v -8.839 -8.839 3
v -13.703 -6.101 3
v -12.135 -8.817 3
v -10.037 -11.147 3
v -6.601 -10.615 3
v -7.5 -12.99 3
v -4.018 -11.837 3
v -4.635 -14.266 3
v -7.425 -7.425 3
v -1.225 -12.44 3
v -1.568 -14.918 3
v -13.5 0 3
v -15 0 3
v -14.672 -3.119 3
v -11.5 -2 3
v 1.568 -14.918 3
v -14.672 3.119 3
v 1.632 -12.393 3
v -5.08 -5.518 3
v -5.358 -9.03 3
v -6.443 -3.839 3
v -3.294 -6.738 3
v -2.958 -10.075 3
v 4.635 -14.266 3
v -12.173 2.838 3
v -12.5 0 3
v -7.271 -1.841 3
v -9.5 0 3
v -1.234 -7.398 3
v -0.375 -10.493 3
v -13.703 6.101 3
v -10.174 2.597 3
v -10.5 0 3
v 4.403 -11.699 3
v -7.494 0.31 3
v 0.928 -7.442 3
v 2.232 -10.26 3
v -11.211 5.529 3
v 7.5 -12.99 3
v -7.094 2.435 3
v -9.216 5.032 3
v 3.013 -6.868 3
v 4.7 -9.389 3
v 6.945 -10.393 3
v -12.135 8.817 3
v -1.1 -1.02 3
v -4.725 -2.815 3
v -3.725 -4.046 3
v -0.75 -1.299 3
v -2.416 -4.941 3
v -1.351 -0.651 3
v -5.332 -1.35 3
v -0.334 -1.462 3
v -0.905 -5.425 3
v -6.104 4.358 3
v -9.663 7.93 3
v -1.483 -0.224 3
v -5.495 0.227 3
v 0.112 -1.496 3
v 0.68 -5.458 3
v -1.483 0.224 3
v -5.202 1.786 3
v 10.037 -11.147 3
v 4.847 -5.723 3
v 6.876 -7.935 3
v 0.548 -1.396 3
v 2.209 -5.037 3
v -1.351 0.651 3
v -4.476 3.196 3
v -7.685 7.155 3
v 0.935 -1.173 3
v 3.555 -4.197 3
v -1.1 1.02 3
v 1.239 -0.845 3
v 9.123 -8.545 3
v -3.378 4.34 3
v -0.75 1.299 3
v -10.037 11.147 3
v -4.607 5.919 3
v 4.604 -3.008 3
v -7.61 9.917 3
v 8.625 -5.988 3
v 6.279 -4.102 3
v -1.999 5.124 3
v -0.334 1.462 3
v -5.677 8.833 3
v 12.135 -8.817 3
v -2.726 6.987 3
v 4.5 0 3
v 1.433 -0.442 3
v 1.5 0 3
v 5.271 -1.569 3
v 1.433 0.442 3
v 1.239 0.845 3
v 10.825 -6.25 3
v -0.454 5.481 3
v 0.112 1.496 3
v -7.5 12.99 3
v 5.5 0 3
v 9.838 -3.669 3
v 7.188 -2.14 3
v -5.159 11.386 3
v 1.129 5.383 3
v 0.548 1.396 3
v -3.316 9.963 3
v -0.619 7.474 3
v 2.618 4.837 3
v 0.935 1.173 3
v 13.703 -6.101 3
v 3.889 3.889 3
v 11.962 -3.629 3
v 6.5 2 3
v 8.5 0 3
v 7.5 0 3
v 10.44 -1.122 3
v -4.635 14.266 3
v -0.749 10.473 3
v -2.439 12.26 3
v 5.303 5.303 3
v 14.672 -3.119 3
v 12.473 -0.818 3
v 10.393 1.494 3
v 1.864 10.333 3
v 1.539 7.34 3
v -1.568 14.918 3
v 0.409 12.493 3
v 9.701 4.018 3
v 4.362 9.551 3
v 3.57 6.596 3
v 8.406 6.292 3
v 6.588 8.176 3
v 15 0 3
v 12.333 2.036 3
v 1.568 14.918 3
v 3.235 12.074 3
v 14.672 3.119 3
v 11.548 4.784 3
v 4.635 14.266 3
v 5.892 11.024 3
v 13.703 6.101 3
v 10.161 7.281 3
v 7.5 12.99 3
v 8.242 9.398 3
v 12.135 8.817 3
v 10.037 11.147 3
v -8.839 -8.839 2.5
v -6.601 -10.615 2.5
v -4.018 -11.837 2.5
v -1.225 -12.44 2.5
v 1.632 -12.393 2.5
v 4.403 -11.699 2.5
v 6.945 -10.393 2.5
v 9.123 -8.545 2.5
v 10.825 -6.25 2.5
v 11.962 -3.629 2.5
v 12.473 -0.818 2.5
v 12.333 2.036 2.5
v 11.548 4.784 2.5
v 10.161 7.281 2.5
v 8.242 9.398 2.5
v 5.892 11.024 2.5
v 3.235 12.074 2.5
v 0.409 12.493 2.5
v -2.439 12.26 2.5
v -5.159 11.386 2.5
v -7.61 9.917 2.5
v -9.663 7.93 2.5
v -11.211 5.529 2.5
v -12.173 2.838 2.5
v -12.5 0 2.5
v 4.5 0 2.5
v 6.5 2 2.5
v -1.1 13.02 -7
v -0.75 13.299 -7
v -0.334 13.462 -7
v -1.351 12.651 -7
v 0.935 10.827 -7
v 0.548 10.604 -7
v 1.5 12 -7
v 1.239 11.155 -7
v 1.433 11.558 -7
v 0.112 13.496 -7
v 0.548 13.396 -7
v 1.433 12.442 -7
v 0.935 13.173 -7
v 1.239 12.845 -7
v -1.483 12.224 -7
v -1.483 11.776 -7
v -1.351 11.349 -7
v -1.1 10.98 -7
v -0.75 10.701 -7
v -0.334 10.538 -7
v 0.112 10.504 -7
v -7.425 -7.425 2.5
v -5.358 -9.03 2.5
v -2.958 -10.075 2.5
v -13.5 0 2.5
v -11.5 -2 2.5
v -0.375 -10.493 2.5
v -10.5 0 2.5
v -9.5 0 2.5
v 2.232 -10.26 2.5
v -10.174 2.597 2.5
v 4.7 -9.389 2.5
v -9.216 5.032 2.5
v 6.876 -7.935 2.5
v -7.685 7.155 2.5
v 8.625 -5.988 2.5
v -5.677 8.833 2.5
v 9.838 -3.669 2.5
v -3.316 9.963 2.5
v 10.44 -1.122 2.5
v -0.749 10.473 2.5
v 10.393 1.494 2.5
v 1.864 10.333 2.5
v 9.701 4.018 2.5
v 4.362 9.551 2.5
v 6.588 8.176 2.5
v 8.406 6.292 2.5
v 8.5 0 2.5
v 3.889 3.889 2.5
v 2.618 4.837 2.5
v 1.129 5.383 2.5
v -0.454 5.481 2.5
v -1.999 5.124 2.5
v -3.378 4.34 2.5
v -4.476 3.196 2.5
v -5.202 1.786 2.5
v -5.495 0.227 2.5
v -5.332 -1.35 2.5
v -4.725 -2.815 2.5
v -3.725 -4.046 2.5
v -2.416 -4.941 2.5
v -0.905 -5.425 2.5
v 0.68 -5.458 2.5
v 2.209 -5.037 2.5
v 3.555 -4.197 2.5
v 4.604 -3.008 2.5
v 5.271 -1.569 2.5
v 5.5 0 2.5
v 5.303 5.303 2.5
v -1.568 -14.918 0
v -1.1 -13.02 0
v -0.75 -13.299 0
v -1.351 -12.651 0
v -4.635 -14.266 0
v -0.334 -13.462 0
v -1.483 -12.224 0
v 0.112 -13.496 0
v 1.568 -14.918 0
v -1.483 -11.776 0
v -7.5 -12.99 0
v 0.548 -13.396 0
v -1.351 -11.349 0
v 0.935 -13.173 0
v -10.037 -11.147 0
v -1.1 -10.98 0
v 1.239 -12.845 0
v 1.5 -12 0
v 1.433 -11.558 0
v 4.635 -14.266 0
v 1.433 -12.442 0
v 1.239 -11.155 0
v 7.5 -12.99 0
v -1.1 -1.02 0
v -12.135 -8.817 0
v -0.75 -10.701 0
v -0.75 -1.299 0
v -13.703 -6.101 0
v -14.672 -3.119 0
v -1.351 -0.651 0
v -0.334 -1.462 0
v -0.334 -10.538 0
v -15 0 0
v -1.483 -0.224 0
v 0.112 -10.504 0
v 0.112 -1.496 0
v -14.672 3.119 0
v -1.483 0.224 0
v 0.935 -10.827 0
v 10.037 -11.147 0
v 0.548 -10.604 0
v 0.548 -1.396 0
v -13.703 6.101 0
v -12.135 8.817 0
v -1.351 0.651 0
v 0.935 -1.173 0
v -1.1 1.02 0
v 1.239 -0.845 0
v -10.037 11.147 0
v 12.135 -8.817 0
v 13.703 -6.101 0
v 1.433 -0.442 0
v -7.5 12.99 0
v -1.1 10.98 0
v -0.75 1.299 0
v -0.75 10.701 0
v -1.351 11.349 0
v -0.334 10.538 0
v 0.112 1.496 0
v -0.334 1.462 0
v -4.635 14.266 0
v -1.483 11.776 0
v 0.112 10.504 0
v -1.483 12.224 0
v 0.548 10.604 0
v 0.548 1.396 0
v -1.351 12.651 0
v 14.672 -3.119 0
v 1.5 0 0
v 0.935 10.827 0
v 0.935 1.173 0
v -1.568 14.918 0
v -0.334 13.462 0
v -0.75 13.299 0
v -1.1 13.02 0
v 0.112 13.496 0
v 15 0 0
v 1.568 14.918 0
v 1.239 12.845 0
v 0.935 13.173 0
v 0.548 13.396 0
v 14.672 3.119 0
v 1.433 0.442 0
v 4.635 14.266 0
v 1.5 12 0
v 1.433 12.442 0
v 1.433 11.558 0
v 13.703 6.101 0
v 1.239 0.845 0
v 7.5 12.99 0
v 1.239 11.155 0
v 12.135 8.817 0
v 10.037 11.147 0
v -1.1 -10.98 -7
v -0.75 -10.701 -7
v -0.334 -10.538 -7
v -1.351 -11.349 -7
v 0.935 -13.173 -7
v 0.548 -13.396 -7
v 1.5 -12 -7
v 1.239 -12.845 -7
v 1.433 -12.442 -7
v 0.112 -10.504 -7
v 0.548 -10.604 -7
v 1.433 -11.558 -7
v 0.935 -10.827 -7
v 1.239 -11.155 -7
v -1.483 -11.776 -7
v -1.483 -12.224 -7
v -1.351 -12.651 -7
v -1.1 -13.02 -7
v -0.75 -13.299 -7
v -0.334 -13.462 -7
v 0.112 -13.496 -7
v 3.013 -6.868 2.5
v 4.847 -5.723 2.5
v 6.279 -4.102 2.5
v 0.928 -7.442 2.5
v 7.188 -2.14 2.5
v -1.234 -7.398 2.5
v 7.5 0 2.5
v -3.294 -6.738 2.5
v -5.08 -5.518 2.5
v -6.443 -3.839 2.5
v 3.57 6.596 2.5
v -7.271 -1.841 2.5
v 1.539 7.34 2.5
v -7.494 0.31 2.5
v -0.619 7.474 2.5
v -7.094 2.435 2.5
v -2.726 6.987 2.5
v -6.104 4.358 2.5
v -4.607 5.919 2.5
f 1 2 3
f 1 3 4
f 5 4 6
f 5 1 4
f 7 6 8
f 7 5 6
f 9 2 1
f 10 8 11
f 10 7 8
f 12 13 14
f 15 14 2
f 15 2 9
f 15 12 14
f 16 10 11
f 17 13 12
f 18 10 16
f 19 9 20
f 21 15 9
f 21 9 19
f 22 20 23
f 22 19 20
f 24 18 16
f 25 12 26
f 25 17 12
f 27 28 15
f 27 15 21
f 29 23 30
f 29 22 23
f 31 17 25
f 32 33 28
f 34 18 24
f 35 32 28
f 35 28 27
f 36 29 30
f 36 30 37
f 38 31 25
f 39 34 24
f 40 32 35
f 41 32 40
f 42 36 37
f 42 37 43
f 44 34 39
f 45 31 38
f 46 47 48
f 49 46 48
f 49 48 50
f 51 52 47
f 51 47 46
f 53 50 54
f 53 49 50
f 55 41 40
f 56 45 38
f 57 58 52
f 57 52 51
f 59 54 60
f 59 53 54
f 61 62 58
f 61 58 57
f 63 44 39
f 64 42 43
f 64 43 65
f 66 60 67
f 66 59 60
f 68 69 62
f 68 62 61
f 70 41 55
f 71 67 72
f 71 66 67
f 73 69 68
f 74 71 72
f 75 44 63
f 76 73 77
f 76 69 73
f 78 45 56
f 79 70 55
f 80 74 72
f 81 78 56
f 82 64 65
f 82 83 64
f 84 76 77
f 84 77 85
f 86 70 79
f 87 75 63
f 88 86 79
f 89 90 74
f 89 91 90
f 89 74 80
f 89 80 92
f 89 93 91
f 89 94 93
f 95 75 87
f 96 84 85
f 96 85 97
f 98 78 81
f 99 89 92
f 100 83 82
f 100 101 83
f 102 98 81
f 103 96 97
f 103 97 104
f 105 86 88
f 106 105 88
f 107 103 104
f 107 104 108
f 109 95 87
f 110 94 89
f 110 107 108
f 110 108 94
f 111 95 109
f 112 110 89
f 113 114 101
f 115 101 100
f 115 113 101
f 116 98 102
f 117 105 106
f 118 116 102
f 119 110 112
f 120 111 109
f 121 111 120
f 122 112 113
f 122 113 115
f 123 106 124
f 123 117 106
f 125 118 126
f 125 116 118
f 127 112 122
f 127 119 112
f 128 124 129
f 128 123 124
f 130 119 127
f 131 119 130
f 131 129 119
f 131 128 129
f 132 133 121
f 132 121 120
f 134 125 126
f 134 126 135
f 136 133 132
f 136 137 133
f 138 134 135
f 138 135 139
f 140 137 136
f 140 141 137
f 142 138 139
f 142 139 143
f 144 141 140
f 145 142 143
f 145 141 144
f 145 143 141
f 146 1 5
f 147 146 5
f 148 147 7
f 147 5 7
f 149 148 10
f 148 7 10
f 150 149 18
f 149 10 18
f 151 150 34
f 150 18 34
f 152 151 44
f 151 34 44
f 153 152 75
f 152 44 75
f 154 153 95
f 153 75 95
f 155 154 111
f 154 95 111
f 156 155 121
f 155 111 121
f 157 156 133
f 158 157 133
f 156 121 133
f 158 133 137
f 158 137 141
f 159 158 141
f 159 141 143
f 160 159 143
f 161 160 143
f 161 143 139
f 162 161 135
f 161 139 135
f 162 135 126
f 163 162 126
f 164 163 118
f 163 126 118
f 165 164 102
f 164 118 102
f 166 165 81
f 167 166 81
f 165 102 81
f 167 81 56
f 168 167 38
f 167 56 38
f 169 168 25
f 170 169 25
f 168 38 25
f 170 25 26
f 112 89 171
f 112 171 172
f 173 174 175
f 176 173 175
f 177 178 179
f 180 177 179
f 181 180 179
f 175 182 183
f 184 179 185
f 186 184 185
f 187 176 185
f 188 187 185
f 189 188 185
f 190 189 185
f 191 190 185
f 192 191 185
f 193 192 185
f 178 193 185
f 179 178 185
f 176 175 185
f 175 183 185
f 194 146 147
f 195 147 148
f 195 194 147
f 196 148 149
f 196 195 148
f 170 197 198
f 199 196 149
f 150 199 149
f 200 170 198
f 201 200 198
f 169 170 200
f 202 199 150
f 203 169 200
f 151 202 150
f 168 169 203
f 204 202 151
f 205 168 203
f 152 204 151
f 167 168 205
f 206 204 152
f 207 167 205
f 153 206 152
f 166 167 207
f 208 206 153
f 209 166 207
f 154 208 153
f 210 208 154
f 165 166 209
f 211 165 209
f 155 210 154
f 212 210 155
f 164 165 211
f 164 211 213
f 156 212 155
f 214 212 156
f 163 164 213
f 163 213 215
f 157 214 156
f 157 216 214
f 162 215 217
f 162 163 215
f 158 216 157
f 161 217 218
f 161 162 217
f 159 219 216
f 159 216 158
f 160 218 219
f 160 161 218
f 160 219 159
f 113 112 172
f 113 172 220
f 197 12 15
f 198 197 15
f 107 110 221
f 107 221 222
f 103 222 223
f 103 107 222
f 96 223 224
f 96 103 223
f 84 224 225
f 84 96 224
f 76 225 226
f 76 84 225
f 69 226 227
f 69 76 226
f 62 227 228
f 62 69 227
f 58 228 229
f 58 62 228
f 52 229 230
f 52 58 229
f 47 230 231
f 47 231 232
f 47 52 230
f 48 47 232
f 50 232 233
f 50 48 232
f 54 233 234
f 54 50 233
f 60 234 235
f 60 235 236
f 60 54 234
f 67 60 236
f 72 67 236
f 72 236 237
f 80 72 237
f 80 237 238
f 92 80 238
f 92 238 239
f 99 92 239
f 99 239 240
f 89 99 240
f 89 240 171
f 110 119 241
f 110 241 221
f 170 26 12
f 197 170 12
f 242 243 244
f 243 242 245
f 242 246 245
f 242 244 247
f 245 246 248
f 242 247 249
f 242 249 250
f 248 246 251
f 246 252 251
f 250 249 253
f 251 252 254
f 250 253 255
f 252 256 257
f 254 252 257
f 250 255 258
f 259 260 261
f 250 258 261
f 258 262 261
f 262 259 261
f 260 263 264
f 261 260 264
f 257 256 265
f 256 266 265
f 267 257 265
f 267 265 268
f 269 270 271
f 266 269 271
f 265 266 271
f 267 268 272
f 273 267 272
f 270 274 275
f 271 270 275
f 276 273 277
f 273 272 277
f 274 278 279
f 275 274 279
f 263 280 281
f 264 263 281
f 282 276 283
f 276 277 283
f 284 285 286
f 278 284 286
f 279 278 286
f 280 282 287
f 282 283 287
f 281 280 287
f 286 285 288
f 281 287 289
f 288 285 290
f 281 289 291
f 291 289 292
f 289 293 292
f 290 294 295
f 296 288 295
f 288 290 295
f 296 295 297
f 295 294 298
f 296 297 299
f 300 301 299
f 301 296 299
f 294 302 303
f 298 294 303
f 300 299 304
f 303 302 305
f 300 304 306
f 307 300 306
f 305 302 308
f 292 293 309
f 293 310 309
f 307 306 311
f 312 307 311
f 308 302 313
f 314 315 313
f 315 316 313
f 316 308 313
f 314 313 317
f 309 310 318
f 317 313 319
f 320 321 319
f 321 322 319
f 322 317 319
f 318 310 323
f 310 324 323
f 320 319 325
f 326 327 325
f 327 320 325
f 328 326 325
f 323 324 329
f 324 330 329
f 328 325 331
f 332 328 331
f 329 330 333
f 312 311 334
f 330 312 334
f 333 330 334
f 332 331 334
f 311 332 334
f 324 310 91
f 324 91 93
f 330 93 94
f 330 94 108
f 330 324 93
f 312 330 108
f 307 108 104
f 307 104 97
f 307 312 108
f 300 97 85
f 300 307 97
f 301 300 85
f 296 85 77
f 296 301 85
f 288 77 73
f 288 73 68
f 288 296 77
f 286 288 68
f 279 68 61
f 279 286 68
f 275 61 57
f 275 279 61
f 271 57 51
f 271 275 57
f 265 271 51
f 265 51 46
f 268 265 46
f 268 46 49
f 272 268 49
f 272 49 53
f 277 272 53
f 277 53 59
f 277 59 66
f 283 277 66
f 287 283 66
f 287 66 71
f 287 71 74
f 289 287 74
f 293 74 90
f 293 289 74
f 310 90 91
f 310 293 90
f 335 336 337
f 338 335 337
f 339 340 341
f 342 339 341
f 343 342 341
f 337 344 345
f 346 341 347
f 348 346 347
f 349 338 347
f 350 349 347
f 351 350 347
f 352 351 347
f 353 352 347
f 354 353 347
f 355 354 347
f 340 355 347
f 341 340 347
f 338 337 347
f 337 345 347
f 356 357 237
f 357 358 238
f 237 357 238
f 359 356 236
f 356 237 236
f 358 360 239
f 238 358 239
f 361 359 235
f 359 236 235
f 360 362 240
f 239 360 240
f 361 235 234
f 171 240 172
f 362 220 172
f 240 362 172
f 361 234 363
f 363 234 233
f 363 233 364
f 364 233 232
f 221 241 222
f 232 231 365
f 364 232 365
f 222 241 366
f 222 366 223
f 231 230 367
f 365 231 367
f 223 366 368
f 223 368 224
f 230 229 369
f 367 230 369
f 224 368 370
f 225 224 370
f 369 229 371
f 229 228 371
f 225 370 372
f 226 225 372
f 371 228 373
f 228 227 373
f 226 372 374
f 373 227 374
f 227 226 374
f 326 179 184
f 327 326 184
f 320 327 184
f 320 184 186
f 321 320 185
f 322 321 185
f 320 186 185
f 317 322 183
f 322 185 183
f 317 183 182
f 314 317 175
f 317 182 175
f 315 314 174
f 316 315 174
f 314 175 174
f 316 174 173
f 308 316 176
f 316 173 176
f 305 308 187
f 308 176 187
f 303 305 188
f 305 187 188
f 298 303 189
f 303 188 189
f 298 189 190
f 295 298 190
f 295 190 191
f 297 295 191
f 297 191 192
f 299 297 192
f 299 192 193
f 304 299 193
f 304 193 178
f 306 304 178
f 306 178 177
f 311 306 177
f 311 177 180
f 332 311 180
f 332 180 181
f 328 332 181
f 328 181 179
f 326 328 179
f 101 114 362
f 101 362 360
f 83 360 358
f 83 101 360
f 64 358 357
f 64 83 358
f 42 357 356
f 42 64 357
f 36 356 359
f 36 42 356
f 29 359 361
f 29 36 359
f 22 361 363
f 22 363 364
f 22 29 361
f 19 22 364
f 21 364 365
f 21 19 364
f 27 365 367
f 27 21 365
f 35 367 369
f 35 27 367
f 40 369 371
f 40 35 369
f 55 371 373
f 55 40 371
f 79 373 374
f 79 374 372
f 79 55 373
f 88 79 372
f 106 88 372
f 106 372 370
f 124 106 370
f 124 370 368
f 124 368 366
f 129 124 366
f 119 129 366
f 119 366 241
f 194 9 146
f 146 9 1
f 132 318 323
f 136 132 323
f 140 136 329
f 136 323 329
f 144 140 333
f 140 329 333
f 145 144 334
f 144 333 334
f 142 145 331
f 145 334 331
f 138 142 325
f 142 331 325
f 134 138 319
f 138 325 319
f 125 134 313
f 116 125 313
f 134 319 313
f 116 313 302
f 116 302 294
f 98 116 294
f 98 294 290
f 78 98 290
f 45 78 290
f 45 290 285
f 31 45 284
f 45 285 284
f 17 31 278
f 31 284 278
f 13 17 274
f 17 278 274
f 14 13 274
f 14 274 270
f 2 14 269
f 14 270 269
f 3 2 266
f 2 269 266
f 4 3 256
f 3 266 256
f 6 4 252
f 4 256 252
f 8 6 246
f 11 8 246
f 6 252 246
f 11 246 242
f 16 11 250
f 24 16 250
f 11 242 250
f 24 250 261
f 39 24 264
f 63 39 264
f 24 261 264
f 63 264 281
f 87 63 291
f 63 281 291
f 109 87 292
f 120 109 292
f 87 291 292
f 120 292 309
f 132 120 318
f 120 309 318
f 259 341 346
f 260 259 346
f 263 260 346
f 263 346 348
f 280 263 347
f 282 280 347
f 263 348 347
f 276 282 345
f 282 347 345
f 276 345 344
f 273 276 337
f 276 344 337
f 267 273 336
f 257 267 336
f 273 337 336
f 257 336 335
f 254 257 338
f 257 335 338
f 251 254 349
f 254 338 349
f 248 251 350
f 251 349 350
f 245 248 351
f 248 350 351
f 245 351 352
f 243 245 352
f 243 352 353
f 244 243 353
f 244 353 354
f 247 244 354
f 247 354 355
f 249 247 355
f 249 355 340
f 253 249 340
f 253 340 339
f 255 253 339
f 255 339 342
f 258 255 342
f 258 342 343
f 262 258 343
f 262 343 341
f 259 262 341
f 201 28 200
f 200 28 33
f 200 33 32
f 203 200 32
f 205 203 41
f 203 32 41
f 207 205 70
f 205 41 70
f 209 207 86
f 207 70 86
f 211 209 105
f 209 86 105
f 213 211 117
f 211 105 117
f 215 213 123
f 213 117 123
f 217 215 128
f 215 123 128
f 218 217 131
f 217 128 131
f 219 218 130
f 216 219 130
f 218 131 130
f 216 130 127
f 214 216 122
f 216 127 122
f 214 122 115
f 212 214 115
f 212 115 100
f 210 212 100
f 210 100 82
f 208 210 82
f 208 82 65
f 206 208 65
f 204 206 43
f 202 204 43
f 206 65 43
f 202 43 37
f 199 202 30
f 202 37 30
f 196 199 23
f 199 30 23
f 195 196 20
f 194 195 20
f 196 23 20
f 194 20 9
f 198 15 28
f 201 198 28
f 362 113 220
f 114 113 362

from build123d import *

# Parameters (mm, degrees)
CROQUIS1_R              = 15
CROQUIS1_R_2            = 1.5
SALIENTE_EXTRUIR1_DEPTH = 3
SALIENTE_EXTRUIR2_START = -10
CROQUIS2_R              = 1.5
SALIENTE_EXTRUIR2_DEPTH = 10
CORTAR_EXTRUIR1_DEPTH   = 0.5


with BuildPart() as part:
    # Croquis1 → Saliente-Extruir1 (new body)
    with BuildSketch(Plane.XY):
        Circle(CROQUIS1_R)
        with Locations((0, 12)):
            Circle(CROQUIS1_R_2, mode=Mode.SUBTRACT)
        with Locations((0, -12)):
            Circle(CROQUIS1_R_2, mode=Mode.SUBTRACT)
        Circle(CROQUIS1_R_2, mode=Mode.SUBTRACT)
    extrude(amount=SALIENTE_EXTRUIR1_DEPTH)

    # Croquis2 → Saliente-Extruir2 (add)
    with BuildSketch(Plane.XY.offset(3).offset(SALIENTE_EXTRUIR2_START)):
        with Locations((0, -12)):
            Circle(CROQUIS2_R)
        with Locations((0, 12)):
            Circle(CROQUIS2_R)
    extrude(amount=SALIENTE_EXTRUIR2_DEPTH)

    # Croquis3 → Cortar-Extruir1 (cut)
    with BuildSketch(Plane.XY.offset(3)):
        with BuildLine():
            Line((-7.424621202, -7.424621202), (-8.838834765, -8.838834765))
            ThreePointArc((-8.838834765, -8.838834765), (11.548494156, 4.783542905), (-12.5, 0))
            Line((-12.5, 0), (-13.5, 0))
            Line((-13.5, 0), (-11.5, -2))
            Line((-11.5, -2), (-9.5, 0))
            Line((-9.5, 0), (-10.5, 0))
            ThreePointArc((-10.5, 0), (9.700735091, 4.01817604), (-7.424621202, -7.424621202))
        make_face()
        with BuildLine():
            Line((5.5, 0), (4.5, 0))
            Line((4.5, 0), (6.5, 2))
            Line((6.5, 2), (8.5, 0))
            Line((8.5, 0), (7.5, 0))
            ThreePointArc((7.5, 0), (-6.929096494, -2.870125743), (5.303300859, 5.303300859))
            Line((5.303300859, 5.303300859), (3.889087297, 3.889087297))
            ThreePointArc((3.889087297, 3.889087297), (-5.081337429, -2.104758878), (5.5, 0))
        make_face()
    extrude(amount=-CORTAR_EXTRUIR1_DEPTH, mode=Mode.SUBTRACT)


solid = part.part
